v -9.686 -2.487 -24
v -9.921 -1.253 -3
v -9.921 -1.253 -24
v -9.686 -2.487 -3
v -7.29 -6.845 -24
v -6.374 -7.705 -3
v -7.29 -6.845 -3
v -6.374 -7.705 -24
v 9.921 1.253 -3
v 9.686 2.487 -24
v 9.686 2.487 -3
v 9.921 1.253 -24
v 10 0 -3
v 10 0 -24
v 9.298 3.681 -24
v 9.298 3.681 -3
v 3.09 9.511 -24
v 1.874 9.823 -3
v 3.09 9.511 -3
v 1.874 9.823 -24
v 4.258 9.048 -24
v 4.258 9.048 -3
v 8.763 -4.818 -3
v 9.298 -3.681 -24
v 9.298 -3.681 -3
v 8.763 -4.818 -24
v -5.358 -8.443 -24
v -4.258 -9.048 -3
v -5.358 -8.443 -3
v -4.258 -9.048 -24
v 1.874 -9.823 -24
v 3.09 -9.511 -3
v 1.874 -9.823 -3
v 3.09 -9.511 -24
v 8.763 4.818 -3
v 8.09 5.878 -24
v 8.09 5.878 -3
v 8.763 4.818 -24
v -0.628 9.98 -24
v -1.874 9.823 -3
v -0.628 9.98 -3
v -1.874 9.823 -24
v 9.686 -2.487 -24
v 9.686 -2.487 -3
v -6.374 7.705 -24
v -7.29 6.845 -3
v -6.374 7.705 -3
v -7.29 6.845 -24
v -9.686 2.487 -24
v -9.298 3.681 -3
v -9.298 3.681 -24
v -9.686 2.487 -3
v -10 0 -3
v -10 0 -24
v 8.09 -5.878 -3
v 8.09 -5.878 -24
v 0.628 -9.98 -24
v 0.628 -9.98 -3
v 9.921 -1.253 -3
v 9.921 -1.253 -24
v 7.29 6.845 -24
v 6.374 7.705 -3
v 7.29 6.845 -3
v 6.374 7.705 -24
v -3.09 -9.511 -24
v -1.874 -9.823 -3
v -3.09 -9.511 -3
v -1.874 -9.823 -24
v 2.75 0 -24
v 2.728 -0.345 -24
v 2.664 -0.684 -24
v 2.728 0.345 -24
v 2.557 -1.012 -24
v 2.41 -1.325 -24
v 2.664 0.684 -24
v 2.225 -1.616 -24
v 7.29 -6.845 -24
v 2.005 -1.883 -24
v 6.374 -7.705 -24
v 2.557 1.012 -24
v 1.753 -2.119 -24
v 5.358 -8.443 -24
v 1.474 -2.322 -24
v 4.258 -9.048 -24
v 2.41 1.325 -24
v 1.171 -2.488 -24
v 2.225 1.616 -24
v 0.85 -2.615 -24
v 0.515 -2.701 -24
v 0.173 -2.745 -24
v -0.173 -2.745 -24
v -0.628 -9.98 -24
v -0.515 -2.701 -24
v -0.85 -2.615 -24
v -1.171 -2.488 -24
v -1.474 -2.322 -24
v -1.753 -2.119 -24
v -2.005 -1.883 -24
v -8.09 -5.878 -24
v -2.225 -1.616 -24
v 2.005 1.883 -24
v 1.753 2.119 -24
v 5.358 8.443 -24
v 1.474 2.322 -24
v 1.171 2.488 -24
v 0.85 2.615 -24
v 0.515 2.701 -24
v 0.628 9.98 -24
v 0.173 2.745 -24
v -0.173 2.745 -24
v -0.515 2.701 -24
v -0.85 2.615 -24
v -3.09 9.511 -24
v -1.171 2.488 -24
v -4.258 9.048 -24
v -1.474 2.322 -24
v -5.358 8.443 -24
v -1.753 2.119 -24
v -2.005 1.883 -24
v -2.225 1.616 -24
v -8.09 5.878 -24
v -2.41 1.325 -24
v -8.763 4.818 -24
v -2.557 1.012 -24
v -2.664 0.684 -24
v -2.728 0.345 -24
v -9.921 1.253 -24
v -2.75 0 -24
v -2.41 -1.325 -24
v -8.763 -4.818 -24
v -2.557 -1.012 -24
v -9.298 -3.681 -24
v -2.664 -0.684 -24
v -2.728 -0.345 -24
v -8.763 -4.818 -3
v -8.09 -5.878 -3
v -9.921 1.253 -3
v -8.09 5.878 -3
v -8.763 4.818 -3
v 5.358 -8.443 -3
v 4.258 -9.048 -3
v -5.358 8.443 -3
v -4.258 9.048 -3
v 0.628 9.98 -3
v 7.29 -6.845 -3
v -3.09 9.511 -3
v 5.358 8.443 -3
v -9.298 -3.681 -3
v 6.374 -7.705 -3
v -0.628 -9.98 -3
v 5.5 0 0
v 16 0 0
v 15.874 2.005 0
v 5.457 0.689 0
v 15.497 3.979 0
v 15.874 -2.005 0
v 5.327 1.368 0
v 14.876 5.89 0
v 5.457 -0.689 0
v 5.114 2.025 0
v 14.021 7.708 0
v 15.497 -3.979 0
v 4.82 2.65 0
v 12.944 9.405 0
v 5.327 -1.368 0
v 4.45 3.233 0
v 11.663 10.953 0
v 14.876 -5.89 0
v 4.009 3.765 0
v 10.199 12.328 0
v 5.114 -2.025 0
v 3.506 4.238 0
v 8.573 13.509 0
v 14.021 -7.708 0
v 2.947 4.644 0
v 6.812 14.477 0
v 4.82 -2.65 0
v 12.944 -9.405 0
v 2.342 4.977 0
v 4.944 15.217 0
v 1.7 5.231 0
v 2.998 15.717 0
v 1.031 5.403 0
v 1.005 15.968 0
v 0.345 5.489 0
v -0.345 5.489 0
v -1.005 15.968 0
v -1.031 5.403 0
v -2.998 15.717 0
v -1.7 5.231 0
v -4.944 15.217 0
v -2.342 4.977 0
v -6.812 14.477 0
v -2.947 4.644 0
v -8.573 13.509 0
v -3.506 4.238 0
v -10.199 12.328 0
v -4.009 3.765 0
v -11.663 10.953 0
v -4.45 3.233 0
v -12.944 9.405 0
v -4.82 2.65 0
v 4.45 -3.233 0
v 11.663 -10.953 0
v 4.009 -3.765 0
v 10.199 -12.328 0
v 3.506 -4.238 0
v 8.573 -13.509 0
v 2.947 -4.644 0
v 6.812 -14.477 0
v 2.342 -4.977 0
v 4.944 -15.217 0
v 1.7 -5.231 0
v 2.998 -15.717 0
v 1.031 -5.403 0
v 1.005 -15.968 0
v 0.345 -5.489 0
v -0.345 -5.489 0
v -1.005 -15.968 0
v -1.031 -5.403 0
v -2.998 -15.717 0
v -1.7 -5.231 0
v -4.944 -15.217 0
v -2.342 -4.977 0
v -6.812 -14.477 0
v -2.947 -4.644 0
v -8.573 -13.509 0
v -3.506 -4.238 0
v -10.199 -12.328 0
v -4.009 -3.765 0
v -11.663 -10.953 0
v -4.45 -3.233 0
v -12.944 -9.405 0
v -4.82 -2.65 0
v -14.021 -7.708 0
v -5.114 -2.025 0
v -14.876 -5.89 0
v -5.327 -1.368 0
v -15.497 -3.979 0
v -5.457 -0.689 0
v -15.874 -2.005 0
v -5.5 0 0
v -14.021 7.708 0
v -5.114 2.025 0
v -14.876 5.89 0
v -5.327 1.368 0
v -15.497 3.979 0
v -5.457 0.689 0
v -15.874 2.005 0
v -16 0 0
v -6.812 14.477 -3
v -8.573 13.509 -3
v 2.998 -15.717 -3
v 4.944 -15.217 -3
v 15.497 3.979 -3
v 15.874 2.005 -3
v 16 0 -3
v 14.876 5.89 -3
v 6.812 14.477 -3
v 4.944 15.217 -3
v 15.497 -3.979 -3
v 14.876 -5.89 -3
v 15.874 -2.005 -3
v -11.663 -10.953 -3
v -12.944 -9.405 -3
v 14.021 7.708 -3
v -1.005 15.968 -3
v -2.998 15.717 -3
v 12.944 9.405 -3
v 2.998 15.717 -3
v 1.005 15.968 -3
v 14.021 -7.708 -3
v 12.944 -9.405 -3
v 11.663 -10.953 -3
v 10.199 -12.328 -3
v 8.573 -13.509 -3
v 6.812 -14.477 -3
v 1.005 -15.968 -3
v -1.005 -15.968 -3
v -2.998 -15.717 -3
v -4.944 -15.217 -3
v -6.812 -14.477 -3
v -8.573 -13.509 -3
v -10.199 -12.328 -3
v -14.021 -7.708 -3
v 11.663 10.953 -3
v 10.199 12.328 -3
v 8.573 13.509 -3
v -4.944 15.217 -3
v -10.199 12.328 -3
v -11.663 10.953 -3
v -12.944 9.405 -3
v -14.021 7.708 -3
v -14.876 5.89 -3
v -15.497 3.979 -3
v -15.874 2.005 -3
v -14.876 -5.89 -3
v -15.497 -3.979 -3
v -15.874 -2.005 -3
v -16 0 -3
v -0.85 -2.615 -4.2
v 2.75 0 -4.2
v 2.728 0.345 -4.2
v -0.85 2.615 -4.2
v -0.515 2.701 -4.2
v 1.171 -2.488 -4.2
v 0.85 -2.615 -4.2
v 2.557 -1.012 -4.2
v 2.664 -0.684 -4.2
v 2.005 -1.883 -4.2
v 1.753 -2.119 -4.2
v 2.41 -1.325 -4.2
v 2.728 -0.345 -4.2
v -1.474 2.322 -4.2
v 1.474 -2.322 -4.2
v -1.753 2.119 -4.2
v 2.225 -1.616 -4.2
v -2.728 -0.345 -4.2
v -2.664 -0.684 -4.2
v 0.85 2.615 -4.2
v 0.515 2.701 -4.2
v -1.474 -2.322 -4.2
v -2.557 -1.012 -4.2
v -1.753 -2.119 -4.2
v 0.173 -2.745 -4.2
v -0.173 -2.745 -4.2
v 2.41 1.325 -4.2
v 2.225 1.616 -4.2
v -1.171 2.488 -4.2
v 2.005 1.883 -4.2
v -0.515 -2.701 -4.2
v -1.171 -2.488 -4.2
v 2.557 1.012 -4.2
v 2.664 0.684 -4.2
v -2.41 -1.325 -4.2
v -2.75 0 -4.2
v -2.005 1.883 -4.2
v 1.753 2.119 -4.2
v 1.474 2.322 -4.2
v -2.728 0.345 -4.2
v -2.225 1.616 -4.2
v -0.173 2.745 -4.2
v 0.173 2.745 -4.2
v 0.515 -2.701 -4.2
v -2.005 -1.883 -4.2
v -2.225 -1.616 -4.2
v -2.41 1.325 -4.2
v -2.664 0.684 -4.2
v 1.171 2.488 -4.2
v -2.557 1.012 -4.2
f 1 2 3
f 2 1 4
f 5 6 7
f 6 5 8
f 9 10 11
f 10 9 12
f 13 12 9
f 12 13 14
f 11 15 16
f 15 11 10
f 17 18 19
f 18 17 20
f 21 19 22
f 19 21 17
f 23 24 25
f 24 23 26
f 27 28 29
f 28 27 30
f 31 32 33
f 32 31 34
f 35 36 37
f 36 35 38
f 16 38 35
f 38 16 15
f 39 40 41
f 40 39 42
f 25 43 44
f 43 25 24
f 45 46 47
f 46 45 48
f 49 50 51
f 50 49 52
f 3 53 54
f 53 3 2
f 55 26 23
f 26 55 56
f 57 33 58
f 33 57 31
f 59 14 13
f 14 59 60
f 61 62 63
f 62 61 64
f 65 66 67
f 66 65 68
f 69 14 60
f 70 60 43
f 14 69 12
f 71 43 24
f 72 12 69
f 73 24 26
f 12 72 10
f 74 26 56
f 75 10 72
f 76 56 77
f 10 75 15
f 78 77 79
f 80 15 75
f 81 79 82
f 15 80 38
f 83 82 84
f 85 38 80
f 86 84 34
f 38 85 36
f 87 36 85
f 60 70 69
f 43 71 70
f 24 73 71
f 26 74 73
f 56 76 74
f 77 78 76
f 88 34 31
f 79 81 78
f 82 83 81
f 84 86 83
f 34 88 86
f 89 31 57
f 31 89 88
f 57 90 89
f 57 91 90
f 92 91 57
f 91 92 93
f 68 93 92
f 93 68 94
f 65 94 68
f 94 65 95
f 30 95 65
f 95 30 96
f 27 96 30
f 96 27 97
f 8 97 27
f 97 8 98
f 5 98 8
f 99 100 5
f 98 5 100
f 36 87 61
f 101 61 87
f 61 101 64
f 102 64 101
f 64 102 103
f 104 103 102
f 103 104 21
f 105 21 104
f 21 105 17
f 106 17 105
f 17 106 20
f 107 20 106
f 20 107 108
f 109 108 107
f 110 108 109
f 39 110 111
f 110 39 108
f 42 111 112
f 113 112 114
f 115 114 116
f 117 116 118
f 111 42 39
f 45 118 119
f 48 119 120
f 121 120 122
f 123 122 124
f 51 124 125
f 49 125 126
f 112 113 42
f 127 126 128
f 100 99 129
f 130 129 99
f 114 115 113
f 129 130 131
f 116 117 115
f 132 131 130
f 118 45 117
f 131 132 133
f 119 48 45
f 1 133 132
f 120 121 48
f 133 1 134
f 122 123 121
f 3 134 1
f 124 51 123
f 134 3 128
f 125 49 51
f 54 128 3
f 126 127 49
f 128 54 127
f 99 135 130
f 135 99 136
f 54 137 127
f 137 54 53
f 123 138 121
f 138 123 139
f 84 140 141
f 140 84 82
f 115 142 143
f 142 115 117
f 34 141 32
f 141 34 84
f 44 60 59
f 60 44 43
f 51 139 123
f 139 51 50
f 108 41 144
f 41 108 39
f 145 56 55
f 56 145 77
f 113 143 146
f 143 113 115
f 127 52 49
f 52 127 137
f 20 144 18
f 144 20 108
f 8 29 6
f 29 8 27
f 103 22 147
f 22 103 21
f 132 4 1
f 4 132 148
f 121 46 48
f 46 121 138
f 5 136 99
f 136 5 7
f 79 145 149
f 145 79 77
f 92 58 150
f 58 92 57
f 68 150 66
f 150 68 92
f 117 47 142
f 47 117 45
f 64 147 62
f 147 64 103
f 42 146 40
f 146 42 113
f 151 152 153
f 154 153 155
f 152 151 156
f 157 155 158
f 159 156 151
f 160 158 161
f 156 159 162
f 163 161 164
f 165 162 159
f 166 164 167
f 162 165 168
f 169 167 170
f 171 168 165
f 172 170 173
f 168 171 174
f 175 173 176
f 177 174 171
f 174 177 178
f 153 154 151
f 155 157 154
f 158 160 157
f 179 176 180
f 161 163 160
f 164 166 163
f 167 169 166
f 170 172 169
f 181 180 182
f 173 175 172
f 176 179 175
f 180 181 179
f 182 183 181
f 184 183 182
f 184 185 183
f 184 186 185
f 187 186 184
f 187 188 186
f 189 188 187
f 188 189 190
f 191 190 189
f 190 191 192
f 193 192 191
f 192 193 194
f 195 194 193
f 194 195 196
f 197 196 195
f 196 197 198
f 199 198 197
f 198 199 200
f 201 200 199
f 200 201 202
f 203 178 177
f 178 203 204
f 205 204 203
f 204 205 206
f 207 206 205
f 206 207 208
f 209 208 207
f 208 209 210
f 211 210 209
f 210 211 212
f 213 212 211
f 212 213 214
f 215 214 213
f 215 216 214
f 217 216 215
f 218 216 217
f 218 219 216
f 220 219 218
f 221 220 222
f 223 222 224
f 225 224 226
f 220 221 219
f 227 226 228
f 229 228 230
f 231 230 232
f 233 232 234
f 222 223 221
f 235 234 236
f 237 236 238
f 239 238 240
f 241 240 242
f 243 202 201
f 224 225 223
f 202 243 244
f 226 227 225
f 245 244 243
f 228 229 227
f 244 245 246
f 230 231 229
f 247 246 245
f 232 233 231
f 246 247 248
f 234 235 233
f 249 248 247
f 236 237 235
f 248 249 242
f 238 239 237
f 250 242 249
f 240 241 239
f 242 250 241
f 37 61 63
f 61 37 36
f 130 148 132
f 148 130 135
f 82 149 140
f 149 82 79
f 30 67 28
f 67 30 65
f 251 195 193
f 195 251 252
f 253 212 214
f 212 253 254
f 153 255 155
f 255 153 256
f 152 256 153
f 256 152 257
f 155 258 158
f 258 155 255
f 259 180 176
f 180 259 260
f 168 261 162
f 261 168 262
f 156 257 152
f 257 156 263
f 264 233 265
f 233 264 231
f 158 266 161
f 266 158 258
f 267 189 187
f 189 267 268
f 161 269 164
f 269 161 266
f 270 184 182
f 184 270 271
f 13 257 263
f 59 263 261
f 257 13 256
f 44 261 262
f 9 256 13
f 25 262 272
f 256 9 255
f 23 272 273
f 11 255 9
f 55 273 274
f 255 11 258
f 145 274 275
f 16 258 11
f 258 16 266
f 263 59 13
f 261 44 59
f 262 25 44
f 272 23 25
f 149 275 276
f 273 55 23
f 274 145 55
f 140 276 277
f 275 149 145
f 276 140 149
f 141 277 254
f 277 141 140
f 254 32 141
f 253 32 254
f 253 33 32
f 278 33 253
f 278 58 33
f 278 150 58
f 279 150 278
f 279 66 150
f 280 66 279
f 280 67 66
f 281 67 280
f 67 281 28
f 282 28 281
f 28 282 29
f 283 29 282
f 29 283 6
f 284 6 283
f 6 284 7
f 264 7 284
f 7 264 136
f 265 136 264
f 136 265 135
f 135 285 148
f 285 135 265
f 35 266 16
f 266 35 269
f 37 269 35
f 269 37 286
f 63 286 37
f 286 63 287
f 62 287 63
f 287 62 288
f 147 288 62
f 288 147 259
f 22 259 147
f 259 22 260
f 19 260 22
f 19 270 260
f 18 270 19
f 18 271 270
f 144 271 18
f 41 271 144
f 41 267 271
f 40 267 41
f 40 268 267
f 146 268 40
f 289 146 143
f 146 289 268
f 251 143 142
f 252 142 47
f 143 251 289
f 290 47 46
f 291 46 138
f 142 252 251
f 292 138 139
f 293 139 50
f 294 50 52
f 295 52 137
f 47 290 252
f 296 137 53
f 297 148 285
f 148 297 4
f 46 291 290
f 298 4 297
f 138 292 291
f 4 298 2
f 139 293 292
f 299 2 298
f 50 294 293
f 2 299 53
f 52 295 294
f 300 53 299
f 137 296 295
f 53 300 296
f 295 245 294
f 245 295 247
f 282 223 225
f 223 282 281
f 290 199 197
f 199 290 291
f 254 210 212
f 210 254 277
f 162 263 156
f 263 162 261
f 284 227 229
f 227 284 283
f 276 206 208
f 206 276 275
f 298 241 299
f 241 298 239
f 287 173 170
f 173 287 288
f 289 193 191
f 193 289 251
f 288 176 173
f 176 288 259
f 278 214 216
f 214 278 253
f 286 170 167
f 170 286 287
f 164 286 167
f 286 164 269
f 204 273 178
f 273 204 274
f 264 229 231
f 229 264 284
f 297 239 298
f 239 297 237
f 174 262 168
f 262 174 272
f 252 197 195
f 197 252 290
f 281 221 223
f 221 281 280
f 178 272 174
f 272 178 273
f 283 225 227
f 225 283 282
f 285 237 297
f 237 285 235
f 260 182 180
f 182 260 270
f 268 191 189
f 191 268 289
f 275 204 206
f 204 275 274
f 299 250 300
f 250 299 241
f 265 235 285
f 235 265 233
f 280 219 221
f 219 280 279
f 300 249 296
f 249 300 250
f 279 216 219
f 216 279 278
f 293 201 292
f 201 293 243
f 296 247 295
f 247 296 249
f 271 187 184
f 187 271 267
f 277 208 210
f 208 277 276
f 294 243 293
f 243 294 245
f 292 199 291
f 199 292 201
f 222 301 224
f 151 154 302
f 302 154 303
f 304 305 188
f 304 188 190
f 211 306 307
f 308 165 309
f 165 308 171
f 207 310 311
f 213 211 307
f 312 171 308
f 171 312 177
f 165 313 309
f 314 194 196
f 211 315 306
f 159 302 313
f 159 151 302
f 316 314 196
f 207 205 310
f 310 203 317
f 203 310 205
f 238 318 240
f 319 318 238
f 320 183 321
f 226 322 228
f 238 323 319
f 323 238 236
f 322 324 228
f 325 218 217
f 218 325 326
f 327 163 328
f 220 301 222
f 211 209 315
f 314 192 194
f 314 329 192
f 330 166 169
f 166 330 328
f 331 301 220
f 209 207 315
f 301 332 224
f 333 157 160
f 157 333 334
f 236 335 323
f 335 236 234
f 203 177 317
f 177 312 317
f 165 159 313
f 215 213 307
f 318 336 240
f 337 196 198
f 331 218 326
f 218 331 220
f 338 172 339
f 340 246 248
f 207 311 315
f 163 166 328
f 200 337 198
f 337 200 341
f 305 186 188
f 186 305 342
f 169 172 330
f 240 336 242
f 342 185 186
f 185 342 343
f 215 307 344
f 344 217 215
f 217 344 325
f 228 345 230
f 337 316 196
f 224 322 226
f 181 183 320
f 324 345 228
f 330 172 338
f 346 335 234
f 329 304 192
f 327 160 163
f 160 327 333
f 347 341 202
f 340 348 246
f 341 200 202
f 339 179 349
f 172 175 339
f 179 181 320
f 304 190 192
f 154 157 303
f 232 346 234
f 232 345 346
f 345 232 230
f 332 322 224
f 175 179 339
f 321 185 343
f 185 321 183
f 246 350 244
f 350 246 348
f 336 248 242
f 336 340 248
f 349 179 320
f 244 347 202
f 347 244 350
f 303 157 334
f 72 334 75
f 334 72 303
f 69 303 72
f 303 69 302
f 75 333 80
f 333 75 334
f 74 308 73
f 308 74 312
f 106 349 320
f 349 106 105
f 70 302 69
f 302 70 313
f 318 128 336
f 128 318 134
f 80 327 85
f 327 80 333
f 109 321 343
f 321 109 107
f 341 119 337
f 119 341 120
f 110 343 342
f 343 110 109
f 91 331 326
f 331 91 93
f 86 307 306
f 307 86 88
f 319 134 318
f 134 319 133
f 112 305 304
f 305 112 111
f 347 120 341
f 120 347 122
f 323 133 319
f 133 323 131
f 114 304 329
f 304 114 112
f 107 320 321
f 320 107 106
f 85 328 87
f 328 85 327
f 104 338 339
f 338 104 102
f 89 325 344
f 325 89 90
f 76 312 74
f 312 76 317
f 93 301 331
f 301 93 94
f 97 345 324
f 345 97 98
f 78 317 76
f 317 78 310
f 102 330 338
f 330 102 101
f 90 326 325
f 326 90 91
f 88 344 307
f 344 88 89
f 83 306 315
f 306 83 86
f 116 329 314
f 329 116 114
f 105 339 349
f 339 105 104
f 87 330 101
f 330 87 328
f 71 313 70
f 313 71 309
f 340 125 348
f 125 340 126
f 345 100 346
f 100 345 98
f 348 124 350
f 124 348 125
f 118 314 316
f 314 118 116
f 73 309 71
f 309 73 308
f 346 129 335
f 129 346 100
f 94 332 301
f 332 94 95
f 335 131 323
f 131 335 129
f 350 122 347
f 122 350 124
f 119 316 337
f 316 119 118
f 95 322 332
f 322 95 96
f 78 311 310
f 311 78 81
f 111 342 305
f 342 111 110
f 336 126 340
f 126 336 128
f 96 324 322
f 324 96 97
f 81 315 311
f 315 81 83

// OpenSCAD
$fn = 50;


difference() {
	union() {
		translate(v = [0, 0, -24.0000000000]) {
			cylinder(h = 24, r = 10.0000000000);
		}
		translate(v = [0, 0, -3.0000000000]) {
			cylinder(h = 3, r = 16.0000000000);
		}
	}
	union() {
		translate(v = [0, 0, 0]) {
			rotate(a = [0, 0, 0]) {
				difference() {
					union() {
						#translate(v = [0, 0, -24.0000000000]) {
							cylinder(h = 24, r = 2.2500000000);
						}
						#translate(v = [0, 0, -4.2000000000]) {
							cylinder(h = 4.2000000000, r1 = 2.7500000000, r2 = 5.5000000000);
						}
						#translate(v = [0, 0, -24.0000000000]) {
							cylinder(h = 24, r = 2.7500000000);
						}
						#translate(v = [0, 0, -24.0000000000]) {
							cylinder(h = 24, r = 2.2500000000);
						}
					}
					union();
				}
			}
		}
	}
}
